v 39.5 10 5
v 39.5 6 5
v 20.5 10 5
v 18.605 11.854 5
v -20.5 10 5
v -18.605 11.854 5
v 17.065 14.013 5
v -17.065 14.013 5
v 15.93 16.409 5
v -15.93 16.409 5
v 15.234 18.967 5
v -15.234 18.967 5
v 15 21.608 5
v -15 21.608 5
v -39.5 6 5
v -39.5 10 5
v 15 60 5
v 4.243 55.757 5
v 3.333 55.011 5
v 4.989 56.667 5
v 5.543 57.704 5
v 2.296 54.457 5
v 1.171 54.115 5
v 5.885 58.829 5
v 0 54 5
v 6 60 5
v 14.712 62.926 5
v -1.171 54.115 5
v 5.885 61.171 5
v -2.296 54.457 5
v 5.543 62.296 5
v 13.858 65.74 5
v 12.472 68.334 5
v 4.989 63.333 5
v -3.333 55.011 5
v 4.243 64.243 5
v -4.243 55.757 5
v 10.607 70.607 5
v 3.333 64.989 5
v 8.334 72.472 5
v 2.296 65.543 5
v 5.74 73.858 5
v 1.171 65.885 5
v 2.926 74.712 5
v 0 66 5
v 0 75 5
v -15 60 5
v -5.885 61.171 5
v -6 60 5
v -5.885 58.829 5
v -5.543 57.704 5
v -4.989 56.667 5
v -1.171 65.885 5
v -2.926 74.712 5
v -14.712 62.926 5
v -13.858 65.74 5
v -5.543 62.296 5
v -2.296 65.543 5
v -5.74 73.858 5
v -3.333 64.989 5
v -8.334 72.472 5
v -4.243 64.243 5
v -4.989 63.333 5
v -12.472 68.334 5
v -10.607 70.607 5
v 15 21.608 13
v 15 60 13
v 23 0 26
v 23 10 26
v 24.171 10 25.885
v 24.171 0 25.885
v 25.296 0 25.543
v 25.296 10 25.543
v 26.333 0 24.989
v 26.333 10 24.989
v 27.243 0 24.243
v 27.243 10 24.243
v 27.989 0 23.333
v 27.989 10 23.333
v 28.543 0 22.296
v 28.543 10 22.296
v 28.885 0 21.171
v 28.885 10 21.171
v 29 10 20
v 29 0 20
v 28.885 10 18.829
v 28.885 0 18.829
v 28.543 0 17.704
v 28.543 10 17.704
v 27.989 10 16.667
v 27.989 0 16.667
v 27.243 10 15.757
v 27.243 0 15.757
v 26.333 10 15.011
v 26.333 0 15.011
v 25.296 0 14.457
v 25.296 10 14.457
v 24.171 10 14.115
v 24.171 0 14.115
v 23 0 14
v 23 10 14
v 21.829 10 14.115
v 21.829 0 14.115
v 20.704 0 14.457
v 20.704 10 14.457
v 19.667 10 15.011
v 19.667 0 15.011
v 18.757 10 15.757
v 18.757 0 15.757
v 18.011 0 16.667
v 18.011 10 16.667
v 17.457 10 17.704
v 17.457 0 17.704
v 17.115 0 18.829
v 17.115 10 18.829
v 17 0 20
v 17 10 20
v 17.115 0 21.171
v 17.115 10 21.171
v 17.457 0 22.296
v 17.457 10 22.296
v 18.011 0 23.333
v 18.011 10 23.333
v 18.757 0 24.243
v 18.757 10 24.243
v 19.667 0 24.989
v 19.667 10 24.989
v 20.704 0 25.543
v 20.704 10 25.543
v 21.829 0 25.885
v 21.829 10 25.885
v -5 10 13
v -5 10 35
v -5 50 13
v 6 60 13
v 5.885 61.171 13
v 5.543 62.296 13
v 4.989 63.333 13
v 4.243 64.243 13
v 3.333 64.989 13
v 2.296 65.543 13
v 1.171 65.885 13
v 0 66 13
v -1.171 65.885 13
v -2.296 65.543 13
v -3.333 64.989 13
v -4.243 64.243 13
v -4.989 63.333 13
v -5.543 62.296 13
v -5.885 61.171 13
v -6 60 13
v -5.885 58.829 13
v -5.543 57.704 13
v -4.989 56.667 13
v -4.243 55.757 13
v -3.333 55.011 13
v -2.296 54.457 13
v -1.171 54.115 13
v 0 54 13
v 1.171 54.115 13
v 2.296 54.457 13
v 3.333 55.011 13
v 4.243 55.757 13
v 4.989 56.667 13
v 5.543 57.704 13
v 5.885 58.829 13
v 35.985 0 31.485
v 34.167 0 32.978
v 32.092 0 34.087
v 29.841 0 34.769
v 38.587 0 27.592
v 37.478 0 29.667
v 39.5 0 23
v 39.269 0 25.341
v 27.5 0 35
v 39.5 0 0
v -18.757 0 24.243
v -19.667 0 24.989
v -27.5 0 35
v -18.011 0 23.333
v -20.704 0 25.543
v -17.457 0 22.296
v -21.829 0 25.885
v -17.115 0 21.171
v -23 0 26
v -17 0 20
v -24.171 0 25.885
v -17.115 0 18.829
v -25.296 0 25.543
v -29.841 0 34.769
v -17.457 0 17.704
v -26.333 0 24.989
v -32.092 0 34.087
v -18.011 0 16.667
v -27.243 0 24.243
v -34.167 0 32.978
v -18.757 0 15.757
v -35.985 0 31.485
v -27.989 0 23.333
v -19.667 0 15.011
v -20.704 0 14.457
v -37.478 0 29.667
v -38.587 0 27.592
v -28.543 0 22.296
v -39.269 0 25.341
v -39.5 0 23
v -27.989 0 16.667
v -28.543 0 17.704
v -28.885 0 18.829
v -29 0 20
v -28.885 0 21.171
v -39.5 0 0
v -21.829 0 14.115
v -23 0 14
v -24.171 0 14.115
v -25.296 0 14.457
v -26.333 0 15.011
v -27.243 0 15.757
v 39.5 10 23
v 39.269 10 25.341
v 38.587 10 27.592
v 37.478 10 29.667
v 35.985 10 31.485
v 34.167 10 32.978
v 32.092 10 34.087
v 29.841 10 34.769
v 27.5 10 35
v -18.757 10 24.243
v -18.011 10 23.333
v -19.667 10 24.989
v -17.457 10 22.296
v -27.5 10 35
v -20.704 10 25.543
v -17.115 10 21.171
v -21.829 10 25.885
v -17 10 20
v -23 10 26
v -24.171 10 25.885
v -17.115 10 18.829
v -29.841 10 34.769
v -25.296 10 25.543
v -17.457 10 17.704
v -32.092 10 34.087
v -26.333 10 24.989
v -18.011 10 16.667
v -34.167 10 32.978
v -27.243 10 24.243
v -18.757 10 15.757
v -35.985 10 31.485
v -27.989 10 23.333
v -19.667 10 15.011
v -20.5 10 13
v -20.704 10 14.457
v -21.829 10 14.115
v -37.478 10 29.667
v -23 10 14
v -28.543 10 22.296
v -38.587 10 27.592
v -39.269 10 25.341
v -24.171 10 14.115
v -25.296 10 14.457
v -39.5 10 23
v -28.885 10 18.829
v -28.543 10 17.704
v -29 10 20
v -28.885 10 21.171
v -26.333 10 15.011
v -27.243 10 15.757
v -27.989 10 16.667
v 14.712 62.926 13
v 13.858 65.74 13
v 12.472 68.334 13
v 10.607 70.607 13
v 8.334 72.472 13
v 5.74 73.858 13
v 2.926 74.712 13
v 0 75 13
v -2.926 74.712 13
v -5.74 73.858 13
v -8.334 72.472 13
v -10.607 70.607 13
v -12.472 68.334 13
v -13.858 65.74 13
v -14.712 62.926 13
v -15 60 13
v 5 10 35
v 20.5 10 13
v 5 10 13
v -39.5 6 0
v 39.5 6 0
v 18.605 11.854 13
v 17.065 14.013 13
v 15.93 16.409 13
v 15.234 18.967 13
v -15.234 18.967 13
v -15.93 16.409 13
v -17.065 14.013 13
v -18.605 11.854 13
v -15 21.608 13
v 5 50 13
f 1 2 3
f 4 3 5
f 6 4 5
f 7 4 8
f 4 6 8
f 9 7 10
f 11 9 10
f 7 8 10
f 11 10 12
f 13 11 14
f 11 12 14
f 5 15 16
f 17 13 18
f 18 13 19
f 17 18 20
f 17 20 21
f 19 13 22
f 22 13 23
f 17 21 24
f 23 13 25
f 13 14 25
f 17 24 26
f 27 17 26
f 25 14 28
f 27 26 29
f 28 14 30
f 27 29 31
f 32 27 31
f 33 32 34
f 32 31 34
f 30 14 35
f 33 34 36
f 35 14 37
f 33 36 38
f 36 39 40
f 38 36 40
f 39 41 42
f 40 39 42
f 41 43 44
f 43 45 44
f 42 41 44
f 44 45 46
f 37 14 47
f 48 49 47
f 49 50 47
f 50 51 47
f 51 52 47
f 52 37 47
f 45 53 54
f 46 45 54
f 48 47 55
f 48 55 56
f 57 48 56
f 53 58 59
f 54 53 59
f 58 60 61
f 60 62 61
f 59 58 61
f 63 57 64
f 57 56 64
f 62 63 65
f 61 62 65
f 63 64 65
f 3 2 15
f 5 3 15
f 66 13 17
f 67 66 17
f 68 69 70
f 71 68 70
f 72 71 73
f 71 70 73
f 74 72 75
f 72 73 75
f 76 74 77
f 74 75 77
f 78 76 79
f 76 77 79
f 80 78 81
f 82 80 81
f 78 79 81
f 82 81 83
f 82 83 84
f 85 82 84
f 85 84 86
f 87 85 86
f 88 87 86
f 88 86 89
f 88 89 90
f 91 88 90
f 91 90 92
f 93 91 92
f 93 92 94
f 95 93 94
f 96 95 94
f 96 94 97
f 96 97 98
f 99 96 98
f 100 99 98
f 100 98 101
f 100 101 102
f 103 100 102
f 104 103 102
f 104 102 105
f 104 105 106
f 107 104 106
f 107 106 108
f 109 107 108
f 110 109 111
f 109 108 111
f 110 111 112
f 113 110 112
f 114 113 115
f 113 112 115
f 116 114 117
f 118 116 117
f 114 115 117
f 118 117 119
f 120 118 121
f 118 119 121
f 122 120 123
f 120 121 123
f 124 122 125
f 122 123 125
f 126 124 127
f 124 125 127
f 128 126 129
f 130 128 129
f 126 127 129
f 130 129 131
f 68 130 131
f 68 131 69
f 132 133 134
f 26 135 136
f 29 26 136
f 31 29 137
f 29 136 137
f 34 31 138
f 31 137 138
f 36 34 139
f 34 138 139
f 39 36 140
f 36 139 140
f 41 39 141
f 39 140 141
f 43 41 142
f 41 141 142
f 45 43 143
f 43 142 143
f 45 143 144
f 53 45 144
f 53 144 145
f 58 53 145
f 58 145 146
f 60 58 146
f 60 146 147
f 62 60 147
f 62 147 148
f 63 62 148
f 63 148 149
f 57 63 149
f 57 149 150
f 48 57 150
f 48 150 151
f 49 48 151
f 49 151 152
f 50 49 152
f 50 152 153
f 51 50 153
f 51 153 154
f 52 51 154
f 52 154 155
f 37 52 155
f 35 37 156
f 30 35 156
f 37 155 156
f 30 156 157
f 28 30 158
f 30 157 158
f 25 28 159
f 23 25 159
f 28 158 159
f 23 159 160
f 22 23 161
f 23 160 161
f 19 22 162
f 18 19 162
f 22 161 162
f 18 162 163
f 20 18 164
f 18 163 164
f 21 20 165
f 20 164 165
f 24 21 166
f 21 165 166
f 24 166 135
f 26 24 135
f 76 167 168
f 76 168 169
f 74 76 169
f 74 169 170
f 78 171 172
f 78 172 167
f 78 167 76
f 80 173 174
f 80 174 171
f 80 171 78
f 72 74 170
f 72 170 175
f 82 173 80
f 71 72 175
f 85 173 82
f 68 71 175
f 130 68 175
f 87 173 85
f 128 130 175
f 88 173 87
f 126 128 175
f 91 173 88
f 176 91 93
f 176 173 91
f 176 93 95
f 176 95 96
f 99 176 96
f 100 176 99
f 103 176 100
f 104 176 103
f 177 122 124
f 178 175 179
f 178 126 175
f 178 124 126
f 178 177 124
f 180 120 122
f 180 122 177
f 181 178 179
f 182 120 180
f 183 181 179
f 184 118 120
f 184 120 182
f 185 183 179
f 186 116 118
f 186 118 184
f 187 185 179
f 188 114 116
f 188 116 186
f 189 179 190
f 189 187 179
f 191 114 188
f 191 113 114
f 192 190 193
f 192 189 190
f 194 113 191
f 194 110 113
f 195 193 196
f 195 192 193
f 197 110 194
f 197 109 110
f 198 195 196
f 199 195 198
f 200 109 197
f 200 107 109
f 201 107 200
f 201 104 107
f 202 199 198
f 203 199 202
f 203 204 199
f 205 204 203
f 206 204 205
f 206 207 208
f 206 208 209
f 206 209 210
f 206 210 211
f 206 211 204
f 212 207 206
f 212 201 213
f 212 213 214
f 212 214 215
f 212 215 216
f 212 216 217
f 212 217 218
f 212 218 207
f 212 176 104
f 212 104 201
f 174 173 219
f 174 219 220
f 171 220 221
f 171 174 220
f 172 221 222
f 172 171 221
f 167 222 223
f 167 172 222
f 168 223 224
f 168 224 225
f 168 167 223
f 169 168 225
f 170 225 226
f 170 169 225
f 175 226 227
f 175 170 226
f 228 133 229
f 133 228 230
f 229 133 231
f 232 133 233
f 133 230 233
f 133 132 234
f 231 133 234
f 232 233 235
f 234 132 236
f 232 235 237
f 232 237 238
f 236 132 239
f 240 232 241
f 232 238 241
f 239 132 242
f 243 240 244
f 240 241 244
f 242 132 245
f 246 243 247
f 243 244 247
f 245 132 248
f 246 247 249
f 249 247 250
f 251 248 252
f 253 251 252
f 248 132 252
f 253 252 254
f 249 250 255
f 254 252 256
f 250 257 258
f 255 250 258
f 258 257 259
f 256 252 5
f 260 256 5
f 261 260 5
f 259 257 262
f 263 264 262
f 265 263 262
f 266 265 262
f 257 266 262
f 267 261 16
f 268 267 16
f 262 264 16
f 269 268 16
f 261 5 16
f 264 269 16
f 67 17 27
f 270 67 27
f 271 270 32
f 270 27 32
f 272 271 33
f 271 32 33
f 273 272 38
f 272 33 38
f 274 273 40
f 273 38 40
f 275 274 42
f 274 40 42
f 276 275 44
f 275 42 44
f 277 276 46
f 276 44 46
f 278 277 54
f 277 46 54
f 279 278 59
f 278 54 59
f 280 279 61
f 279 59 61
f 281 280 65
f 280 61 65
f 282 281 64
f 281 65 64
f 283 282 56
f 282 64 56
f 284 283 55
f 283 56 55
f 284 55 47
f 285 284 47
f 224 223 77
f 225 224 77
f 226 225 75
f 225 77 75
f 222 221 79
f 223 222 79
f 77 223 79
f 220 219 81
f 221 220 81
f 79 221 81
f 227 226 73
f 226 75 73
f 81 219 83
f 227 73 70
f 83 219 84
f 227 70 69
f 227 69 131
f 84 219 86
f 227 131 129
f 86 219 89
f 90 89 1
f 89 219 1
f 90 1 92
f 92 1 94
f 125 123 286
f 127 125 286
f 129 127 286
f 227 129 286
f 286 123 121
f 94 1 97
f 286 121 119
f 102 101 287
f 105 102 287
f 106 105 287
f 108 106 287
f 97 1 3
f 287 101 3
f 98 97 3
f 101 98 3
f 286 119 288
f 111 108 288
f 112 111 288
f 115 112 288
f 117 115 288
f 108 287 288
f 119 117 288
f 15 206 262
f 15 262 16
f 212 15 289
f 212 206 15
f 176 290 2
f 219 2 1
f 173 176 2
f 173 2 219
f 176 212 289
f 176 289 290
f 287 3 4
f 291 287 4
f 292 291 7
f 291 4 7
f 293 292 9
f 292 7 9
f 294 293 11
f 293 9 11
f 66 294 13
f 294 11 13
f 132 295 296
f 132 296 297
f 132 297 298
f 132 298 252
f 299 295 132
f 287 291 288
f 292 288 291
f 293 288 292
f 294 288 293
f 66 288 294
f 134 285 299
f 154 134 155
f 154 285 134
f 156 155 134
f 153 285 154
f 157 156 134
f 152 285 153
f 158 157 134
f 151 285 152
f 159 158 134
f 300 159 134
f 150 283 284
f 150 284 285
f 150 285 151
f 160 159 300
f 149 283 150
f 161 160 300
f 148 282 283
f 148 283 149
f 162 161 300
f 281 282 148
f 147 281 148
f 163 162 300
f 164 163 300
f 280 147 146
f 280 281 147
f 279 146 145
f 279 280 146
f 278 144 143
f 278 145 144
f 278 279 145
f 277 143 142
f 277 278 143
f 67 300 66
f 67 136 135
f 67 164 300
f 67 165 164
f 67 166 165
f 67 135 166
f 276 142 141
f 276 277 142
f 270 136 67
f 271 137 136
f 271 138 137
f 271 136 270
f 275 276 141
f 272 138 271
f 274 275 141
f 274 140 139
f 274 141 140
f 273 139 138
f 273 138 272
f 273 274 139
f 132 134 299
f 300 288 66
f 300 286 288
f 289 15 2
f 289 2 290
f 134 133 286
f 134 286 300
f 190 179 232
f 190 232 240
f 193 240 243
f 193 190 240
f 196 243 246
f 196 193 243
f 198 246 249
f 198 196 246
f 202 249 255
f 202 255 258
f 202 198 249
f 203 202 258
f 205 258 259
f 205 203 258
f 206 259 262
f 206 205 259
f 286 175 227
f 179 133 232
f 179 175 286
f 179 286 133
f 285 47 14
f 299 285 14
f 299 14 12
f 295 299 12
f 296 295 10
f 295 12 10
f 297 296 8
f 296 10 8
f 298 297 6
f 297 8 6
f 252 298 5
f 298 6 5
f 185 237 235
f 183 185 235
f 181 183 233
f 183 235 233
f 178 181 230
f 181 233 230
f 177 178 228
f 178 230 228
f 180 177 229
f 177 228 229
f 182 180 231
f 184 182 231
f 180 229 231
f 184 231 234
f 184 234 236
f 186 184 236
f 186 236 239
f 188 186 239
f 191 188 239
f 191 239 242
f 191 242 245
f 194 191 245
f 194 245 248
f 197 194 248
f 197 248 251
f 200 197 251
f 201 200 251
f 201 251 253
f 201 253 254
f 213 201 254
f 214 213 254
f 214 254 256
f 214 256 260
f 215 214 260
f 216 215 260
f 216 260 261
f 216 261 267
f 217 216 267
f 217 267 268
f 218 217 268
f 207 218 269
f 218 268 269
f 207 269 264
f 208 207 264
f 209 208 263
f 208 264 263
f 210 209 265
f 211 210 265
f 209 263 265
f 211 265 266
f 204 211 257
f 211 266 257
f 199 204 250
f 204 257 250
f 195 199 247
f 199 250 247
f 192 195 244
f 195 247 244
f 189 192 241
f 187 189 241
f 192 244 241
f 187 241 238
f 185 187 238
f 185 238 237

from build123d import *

# Parameters (mm, degrees)
BOSS_EXTRUDE1_DEPTH     = 10
SKETCH2_W               = 5
SKETCH2_H               = 4
CUT_EXTRUDE1_DEPTH      = 79
BOSS_EXTRUDE2_DEPTH     = 13
CUT_EXTRUDE2_DEPTH      = 100.097174531
CUT_EXTRUDE2_DEPTH_BACK = 100.097174531
SKETCH6_W               = 5
SKETCH6_H               = 65
SKETCH7_R               = 6
CUT_EXTRUDE3_DEPTH      = 13
RIB1_REACH              = 93.707
SKETCH8_WALL_W          = 231.065679212
SKETCH8_WALL_H          = 10
SKETCH9_R               = 6
CUT_EXTRUDE4_DEPTH      = 13


with BuildPart() as part:
    # Sketch1 → Boss-Extrude1 (new body)
    with BuildSketch(Plane(origin=(0, 0, 0), x_dir=(1, 0, 0), z_dir=(0, 1, 0))):
        with BuildLine():
            Line((-39.5, 0), (39.5, 0))
            Line((39.5, 0), (39.5, -23))
            ThreePointArc((39.5, -23), (35.985281374, -31.485281374), (27.5, -35))
            Line((27.5, -35), (-27.5, -35))
            ThreePointArc((-27.5, -35), (-35.985281374, -31.485281374), (-39.5, -23))
            Line((-39.5, -23), (-39.5, 0))
        make_face()
    extrude(amount=BOSS_EXTRUDE1_DEPTH)

    # Sketch2 → Cut-Extrude1 (cut)
    with BuildSketch(Plane(origin=(39.5, 0, 0), x_dir=(0, 0, -1), z_dir=(1, 0, 0))):
        with Locations((-2.5, 8)):
            Rectangle(SKETCH2_W, SKETCH2_H)
    extrude(amount=-CUT_EXTRUDE1_DEPTH, mode=Mode.SUBTRACT)

    # Sketch5 → Boss-Extrude2 (add)
    with BuildSketch(Plane.XY):
        with BuildLine():
            Line((-15, 60), (-15, 21.608186766))
            ThreePointArc((-15, 21.608186766), (-16.444558288, 15.185570477), (-20.5, 10))
            Line((-20.5, 10), (20.5, 10))
            ThreePointArc((20.5, 10), (16.444558288, 15.185570477), (15, 21.608186766))
            Line((15, 21.608186766), (15, 60))
            ThreePointArc((15, 60), (0, 75), (-15, 60))
        make_face()
    extrude(amount=BOSS_EXTRUDE2_DEPTH)

    # Sketch6 → Cut-Extrude2 (cut, two sides: drawn at the far end of the back side and taken through both)
    with BuildSketch(Plane(origin=(15, 0, 0), x_dir=(0, 0, -1), z_dir=(1, 0, 0)).offset(-CUT_EXTRUDE2_DEPTH_BACK)):
        with Locations((-2.5, 42.5)):
            Rectangle(SKETCH6_W, SKETCH6_H)
    extrude(amount=CUT_EXTRUDE2_DEPTH + CUT_EXTRUDE2_DEPTH_BACK, mode=Mode.SUBTRACT)

    # Sketch7 → Cut-Extrude3 (cut)
    with BuildSketch(Plane.XY.offset(13)):
        with Locations((0, 60)):
            Circle(SKETCH7_R)
    extrude(amount=-CUT_EXTRUDE3_DEPTH, mode=Mode.SUBTRACT)

    # Sketch8 wall → Rib1 (add, up to next)
    with BuildSketch(Plane(origin=(0, 30, 24), x_dir=(0, 0.876215908677, -0.481918749772), z_dir=(0, 0.481918749772, 0.876215908677)), mode=Mode.PRIVATE) as rib1_sk1:
        Rectangle(SKETCH8_WALL_W, SKETCH8_WALL_H)
    rib1_tool1 = extrude(rib1_sk1.sketch, amount=-RIB1_REACH, mode=Mode.PRIVATE) - part.part
    add(rib1_tool1.solids().sort_by_distance((0, 30, 24))[0])

    # Sketch9 → Cut-Extrude4 (cut)
    with BuildSketch(Plane(origin=(0, 10, 0), x_dir=(1, 0, 0), z_dir=(0, 1, 0))):
        with Locations(Location((23, -20, 0), (0, 0, 270))):
            Circle(SKETCH9_R)
        with Locations(Location((-23, -20, 0), (0, 0, 270))):
            Circle(SKETCH9_R)
    extrude(amount=-CUT_EXTRUDE4_DEPTH, mode=Mode.SUBTRACT)


solid = part.part
